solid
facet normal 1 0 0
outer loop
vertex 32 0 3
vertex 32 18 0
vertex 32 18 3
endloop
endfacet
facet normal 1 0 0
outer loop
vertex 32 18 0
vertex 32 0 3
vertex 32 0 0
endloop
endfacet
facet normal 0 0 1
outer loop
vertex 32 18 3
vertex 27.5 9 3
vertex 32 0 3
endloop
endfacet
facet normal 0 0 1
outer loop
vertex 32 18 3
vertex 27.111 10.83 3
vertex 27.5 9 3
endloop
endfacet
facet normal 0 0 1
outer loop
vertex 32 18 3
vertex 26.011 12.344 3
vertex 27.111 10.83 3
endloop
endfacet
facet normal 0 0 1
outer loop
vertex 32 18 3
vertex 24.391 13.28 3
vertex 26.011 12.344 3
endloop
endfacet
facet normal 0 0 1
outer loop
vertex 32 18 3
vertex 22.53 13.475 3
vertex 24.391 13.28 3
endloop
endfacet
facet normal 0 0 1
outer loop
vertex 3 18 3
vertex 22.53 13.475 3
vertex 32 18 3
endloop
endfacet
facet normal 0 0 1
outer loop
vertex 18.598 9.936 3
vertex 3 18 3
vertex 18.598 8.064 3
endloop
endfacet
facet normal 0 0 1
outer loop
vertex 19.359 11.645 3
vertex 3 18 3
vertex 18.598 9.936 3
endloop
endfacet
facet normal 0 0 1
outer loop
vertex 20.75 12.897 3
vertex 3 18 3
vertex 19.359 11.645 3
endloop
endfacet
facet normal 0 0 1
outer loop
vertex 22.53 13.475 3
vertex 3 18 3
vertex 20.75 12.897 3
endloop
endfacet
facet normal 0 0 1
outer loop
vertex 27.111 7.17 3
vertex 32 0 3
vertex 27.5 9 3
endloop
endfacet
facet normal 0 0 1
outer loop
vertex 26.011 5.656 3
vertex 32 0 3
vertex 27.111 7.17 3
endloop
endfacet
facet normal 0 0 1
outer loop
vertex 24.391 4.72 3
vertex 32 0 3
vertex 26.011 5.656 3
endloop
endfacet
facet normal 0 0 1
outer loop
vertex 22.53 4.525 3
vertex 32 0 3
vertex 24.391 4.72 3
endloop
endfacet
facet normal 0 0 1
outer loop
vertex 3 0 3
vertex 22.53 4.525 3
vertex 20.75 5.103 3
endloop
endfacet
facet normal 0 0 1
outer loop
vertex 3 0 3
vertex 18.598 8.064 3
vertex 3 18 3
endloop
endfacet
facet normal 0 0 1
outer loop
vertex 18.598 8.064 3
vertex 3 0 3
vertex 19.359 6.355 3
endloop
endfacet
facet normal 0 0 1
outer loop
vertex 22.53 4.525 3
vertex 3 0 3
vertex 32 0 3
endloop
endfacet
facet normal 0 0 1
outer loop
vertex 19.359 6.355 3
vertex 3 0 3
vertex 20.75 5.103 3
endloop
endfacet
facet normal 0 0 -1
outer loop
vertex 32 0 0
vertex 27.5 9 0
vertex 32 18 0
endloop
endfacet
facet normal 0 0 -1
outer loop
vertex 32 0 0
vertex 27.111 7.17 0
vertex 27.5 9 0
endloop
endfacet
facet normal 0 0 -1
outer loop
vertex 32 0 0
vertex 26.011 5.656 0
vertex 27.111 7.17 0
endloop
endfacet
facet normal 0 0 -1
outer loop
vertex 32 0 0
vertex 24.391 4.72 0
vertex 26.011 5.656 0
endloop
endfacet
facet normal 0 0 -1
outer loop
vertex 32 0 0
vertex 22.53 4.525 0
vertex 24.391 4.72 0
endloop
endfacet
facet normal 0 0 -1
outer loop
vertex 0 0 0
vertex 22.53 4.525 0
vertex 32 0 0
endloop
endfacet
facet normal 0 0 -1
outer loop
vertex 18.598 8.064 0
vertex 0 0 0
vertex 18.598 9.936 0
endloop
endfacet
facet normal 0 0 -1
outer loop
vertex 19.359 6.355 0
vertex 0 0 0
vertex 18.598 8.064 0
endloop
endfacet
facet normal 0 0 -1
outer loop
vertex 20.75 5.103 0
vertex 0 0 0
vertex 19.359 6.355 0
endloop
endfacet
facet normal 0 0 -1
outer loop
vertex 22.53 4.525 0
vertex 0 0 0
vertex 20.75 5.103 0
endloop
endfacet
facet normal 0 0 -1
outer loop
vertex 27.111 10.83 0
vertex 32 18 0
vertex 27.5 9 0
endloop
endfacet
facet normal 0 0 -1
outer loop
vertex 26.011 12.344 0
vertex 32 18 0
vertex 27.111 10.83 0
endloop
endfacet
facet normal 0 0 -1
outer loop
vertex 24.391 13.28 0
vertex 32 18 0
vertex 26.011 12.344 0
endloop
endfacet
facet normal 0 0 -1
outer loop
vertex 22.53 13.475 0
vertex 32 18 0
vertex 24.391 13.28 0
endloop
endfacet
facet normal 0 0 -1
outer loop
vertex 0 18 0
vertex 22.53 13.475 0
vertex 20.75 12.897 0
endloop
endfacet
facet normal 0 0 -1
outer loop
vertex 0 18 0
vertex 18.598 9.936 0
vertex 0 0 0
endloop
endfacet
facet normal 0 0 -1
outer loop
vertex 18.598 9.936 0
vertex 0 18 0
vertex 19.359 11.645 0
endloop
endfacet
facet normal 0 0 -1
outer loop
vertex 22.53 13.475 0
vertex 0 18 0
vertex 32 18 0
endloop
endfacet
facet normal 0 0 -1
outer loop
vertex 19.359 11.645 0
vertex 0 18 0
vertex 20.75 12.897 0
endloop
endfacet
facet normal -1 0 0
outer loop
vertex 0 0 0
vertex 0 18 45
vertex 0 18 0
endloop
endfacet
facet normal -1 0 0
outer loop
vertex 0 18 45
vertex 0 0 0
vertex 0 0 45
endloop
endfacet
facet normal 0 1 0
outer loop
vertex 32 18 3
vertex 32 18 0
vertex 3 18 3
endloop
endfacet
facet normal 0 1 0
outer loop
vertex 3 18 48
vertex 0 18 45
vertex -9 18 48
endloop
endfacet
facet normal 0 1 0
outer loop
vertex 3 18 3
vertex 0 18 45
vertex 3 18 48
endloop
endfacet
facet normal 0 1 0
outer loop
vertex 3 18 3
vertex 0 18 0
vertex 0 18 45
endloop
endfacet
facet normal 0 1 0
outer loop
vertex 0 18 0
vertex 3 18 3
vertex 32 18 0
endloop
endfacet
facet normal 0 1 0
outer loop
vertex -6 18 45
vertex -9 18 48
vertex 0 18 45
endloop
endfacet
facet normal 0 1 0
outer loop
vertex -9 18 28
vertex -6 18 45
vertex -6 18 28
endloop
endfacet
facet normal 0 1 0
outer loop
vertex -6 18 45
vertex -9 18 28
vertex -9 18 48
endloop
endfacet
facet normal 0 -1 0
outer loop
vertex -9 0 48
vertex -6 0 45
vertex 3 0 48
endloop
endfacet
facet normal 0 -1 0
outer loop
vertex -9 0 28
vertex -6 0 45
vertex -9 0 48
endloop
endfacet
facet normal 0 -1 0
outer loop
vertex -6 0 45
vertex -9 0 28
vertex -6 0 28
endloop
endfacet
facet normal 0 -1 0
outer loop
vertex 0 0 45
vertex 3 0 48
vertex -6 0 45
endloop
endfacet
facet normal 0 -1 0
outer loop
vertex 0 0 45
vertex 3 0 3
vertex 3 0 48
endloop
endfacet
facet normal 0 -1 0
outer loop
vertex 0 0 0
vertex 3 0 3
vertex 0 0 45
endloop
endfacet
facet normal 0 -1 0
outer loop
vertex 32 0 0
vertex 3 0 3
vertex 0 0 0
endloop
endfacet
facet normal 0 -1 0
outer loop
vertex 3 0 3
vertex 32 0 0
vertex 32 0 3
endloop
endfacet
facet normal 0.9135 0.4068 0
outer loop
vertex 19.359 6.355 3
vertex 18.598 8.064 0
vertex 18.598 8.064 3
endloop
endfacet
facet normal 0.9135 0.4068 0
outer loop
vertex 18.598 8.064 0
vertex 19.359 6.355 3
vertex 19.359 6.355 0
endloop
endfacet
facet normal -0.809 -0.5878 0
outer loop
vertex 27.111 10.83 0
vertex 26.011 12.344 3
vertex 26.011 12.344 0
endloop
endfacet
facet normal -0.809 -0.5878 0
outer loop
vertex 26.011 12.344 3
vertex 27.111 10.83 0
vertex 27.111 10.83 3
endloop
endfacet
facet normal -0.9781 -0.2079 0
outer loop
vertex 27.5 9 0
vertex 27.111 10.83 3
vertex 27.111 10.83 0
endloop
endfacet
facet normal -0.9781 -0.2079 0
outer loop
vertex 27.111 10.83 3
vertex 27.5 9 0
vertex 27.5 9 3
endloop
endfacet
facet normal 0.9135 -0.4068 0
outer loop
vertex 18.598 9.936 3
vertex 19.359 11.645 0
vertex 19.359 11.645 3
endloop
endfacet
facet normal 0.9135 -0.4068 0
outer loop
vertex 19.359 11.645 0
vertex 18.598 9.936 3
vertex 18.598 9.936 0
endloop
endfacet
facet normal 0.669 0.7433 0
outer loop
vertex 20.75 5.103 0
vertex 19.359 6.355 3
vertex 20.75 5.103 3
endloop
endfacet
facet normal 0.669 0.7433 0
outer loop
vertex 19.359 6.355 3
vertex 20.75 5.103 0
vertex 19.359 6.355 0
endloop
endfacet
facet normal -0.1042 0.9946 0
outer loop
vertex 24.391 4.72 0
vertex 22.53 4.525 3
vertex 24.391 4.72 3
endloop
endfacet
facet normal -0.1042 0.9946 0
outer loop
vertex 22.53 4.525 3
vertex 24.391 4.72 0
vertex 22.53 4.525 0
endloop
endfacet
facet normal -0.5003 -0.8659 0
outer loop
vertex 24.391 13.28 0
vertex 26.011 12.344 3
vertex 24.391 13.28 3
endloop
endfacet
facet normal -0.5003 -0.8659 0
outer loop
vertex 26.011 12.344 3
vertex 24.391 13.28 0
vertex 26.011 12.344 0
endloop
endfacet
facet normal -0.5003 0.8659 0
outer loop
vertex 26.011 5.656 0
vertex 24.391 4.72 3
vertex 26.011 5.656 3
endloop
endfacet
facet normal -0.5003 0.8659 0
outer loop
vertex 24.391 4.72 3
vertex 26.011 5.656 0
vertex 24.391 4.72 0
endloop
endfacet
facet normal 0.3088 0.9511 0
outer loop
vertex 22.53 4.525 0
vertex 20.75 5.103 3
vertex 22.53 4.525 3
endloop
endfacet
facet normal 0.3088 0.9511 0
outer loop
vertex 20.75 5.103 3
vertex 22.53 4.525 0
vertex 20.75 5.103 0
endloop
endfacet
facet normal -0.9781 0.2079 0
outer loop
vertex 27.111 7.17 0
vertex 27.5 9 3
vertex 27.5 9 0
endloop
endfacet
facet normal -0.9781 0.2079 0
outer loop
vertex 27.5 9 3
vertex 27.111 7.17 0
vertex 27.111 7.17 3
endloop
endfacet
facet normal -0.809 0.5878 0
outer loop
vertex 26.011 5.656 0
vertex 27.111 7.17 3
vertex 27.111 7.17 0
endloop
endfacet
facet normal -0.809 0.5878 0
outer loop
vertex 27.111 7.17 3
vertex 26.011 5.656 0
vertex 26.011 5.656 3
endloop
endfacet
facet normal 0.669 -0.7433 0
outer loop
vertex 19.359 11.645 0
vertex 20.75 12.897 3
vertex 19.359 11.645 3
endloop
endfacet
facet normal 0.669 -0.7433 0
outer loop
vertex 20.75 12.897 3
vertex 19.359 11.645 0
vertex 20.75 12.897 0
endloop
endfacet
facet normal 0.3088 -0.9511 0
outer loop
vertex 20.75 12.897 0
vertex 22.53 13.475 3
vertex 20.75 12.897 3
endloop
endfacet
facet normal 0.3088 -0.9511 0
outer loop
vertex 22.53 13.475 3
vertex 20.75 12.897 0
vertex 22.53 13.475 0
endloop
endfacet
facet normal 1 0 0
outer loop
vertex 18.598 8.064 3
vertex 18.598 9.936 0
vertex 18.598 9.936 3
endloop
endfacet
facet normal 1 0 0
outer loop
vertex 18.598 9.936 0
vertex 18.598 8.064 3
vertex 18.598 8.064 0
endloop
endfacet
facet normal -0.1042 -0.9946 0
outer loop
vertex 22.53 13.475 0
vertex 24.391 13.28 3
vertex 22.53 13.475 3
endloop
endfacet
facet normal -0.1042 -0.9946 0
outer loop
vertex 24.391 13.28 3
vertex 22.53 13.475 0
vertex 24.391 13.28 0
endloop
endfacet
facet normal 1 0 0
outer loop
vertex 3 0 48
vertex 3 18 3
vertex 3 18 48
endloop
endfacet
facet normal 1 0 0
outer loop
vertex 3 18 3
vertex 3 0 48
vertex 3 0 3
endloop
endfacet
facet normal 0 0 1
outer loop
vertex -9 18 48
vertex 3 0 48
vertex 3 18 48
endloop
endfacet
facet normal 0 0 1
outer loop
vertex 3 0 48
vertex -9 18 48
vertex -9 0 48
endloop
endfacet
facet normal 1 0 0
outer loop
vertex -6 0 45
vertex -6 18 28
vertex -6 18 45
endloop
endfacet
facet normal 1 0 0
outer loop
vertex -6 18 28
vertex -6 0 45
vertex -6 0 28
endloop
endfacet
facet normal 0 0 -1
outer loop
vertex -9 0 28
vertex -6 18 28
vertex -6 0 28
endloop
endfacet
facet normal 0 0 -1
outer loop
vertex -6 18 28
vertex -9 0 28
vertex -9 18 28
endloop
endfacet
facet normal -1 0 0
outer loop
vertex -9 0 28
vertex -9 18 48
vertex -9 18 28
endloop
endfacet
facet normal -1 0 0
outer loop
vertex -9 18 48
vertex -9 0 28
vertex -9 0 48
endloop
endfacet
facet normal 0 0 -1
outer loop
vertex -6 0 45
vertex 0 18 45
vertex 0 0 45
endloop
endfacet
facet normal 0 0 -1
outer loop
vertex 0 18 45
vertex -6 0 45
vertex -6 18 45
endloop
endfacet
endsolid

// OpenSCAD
filter_wall=6;
holder_wall=3;
offset_v=45;
offset_h=20;
hole=9;
cube([holder_wall,2*hole,offset_v+holder_wall]);
tail=min(20,offset_v+holder_wall);
translate([-holder_wall-filter_wall,0,offset_v+holder_wall-tail])cube([holder_wall,2*hole,tail]);
translate([-filter_wall,0,offset_v])cube([filter_wall,2*hole,holder_wall]);
difference() {
cube([offset_h+hole+holder_wall,2*hole,holder_wall]);
translate([offset_h+holder_wall,hole,holder_wall/2])cylinder(h=holder_wall+0.02,d=hole,center=true);
}
